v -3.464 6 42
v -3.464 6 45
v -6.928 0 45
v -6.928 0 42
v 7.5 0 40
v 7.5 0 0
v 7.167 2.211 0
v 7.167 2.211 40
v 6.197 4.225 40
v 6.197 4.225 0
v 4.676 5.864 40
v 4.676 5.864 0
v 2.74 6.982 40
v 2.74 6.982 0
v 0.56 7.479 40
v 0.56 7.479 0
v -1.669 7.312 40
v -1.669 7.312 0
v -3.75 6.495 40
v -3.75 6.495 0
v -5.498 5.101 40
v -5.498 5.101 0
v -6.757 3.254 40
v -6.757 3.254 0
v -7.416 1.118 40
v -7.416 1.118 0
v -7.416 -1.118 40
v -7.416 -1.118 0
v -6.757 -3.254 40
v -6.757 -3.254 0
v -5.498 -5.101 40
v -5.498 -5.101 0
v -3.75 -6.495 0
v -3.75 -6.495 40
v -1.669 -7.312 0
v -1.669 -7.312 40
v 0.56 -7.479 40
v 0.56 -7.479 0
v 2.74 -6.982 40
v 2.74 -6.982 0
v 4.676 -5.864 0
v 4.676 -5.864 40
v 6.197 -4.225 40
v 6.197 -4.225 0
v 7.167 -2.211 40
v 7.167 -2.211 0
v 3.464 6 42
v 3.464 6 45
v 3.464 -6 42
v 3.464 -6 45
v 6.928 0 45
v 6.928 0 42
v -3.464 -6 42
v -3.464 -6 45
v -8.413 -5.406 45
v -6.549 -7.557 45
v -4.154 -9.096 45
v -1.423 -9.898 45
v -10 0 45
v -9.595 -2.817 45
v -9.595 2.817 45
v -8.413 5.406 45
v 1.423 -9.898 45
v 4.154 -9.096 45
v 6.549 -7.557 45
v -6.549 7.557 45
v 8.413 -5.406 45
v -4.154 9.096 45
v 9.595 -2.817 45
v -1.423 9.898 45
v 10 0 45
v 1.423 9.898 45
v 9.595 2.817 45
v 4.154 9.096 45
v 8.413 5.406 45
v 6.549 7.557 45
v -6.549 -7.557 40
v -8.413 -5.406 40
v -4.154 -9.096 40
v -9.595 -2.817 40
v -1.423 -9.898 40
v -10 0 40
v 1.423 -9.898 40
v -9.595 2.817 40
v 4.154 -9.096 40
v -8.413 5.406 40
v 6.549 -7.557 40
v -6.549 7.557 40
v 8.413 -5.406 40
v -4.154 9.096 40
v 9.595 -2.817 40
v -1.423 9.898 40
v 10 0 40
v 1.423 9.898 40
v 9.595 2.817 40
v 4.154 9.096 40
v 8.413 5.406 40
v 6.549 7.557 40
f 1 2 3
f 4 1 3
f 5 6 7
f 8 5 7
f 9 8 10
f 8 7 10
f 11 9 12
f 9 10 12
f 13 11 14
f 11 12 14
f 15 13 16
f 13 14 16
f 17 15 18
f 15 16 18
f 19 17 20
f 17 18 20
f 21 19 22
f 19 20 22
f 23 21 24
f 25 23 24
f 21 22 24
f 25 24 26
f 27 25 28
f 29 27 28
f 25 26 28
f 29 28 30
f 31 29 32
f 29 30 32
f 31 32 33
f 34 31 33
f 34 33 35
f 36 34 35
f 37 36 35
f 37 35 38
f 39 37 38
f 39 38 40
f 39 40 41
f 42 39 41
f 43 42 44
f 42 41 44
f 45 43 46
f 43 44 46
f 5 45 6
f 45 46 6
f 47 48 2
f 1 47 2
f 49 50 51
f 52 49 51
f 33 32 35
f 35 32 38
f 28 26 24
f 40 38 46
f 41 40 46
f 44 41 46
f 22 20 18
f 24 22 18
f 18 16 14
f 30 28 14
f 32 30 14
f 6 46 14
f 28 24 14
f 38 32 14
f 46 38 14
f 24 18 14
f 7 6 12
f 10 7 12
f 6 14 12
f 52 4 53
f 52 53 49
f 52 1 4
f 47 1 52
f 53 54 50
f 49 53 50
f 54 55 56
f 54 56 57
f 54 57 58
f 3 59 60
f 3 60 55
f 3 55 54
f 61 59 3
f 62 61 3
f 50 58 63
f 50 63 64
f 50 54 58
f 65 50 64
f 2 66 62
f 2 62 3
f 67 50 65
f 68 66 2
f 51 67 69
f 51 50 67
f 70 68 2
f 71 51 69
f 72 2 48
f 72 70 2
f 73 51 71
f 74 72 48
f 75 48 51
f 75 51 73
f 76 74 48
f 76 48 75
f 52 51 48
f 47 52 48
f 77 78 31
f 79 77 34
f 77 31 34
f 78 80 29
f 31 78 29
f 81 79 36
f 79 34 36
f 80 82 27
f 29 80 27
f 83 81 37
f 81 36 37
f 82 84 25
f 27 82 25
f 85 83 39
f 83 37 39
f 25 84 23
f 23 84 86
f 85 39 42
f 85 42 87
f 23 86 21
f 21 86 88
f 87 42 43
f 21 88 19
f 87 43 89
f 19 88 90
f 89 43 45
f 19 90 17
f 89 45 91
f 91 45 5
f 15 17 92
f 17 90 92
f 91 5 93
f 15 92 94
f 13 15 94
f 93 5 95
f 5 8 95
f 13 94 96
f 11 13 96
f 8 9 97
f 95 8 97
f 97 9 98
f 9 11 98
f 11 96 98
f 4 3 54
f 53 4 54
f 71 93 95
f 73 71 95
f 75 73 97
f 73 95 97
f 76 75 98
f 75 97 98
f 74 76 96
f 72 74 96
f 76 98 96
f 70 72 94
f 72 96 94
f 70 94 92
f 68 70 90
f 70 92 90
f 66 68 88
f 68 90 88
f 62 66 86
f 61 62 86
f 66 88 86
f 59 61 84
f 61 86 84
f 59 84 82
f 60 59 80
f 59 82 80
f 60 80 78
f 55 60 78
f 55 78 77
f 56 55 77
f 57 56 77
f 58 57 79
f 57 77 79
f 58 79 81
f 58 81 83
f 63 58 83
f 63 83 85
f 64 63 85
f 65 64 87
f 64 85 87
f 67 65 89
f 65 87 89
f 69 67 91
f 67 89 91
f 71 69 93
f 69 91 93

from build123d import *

# Parameters (mm, degrees)
SKETCH1_R           = 7.5
BOSS_EXTRUDE1_DEPTH = 40
SKETCH2_R           = 10
BOSS_EXTRUDE2_DEPTH = 5
CUT_EXTRUDE1_DEPTH  = 3


with BuildPart() as part:
    # Sketch1 → Boss-Extrude1 (new body)
    with BuildSketch(Plane.XY):
        Circle(SKETCH1_R)
    extrude(amount=BOSS_EXTRUDE1_DEPTH)

    # Sketch2 → Boss-Extrude2 (add)
    with BuildSketch(Plane.XY.offset(40)):
        Circle(SKETCH2_R)
    extrude(amount=BOSS_EXTRUDE2_DEPTH)

    # Sketch3 → Cut-Extrude1 (cut)
    with BuildSketch(Plane.XY.offset(45)):
        Polygon((-6.92820323, 0), (-3.464101615, -6), (3.464101615, -6), (6.92820323, 0), (3.464101615, 6), (-3.464101615, 6), align=None)
    extrude(amount=-CUT_EXTRUDE1_DEPTH, mode=Mode.SUBTRACT)


solid = part.part
